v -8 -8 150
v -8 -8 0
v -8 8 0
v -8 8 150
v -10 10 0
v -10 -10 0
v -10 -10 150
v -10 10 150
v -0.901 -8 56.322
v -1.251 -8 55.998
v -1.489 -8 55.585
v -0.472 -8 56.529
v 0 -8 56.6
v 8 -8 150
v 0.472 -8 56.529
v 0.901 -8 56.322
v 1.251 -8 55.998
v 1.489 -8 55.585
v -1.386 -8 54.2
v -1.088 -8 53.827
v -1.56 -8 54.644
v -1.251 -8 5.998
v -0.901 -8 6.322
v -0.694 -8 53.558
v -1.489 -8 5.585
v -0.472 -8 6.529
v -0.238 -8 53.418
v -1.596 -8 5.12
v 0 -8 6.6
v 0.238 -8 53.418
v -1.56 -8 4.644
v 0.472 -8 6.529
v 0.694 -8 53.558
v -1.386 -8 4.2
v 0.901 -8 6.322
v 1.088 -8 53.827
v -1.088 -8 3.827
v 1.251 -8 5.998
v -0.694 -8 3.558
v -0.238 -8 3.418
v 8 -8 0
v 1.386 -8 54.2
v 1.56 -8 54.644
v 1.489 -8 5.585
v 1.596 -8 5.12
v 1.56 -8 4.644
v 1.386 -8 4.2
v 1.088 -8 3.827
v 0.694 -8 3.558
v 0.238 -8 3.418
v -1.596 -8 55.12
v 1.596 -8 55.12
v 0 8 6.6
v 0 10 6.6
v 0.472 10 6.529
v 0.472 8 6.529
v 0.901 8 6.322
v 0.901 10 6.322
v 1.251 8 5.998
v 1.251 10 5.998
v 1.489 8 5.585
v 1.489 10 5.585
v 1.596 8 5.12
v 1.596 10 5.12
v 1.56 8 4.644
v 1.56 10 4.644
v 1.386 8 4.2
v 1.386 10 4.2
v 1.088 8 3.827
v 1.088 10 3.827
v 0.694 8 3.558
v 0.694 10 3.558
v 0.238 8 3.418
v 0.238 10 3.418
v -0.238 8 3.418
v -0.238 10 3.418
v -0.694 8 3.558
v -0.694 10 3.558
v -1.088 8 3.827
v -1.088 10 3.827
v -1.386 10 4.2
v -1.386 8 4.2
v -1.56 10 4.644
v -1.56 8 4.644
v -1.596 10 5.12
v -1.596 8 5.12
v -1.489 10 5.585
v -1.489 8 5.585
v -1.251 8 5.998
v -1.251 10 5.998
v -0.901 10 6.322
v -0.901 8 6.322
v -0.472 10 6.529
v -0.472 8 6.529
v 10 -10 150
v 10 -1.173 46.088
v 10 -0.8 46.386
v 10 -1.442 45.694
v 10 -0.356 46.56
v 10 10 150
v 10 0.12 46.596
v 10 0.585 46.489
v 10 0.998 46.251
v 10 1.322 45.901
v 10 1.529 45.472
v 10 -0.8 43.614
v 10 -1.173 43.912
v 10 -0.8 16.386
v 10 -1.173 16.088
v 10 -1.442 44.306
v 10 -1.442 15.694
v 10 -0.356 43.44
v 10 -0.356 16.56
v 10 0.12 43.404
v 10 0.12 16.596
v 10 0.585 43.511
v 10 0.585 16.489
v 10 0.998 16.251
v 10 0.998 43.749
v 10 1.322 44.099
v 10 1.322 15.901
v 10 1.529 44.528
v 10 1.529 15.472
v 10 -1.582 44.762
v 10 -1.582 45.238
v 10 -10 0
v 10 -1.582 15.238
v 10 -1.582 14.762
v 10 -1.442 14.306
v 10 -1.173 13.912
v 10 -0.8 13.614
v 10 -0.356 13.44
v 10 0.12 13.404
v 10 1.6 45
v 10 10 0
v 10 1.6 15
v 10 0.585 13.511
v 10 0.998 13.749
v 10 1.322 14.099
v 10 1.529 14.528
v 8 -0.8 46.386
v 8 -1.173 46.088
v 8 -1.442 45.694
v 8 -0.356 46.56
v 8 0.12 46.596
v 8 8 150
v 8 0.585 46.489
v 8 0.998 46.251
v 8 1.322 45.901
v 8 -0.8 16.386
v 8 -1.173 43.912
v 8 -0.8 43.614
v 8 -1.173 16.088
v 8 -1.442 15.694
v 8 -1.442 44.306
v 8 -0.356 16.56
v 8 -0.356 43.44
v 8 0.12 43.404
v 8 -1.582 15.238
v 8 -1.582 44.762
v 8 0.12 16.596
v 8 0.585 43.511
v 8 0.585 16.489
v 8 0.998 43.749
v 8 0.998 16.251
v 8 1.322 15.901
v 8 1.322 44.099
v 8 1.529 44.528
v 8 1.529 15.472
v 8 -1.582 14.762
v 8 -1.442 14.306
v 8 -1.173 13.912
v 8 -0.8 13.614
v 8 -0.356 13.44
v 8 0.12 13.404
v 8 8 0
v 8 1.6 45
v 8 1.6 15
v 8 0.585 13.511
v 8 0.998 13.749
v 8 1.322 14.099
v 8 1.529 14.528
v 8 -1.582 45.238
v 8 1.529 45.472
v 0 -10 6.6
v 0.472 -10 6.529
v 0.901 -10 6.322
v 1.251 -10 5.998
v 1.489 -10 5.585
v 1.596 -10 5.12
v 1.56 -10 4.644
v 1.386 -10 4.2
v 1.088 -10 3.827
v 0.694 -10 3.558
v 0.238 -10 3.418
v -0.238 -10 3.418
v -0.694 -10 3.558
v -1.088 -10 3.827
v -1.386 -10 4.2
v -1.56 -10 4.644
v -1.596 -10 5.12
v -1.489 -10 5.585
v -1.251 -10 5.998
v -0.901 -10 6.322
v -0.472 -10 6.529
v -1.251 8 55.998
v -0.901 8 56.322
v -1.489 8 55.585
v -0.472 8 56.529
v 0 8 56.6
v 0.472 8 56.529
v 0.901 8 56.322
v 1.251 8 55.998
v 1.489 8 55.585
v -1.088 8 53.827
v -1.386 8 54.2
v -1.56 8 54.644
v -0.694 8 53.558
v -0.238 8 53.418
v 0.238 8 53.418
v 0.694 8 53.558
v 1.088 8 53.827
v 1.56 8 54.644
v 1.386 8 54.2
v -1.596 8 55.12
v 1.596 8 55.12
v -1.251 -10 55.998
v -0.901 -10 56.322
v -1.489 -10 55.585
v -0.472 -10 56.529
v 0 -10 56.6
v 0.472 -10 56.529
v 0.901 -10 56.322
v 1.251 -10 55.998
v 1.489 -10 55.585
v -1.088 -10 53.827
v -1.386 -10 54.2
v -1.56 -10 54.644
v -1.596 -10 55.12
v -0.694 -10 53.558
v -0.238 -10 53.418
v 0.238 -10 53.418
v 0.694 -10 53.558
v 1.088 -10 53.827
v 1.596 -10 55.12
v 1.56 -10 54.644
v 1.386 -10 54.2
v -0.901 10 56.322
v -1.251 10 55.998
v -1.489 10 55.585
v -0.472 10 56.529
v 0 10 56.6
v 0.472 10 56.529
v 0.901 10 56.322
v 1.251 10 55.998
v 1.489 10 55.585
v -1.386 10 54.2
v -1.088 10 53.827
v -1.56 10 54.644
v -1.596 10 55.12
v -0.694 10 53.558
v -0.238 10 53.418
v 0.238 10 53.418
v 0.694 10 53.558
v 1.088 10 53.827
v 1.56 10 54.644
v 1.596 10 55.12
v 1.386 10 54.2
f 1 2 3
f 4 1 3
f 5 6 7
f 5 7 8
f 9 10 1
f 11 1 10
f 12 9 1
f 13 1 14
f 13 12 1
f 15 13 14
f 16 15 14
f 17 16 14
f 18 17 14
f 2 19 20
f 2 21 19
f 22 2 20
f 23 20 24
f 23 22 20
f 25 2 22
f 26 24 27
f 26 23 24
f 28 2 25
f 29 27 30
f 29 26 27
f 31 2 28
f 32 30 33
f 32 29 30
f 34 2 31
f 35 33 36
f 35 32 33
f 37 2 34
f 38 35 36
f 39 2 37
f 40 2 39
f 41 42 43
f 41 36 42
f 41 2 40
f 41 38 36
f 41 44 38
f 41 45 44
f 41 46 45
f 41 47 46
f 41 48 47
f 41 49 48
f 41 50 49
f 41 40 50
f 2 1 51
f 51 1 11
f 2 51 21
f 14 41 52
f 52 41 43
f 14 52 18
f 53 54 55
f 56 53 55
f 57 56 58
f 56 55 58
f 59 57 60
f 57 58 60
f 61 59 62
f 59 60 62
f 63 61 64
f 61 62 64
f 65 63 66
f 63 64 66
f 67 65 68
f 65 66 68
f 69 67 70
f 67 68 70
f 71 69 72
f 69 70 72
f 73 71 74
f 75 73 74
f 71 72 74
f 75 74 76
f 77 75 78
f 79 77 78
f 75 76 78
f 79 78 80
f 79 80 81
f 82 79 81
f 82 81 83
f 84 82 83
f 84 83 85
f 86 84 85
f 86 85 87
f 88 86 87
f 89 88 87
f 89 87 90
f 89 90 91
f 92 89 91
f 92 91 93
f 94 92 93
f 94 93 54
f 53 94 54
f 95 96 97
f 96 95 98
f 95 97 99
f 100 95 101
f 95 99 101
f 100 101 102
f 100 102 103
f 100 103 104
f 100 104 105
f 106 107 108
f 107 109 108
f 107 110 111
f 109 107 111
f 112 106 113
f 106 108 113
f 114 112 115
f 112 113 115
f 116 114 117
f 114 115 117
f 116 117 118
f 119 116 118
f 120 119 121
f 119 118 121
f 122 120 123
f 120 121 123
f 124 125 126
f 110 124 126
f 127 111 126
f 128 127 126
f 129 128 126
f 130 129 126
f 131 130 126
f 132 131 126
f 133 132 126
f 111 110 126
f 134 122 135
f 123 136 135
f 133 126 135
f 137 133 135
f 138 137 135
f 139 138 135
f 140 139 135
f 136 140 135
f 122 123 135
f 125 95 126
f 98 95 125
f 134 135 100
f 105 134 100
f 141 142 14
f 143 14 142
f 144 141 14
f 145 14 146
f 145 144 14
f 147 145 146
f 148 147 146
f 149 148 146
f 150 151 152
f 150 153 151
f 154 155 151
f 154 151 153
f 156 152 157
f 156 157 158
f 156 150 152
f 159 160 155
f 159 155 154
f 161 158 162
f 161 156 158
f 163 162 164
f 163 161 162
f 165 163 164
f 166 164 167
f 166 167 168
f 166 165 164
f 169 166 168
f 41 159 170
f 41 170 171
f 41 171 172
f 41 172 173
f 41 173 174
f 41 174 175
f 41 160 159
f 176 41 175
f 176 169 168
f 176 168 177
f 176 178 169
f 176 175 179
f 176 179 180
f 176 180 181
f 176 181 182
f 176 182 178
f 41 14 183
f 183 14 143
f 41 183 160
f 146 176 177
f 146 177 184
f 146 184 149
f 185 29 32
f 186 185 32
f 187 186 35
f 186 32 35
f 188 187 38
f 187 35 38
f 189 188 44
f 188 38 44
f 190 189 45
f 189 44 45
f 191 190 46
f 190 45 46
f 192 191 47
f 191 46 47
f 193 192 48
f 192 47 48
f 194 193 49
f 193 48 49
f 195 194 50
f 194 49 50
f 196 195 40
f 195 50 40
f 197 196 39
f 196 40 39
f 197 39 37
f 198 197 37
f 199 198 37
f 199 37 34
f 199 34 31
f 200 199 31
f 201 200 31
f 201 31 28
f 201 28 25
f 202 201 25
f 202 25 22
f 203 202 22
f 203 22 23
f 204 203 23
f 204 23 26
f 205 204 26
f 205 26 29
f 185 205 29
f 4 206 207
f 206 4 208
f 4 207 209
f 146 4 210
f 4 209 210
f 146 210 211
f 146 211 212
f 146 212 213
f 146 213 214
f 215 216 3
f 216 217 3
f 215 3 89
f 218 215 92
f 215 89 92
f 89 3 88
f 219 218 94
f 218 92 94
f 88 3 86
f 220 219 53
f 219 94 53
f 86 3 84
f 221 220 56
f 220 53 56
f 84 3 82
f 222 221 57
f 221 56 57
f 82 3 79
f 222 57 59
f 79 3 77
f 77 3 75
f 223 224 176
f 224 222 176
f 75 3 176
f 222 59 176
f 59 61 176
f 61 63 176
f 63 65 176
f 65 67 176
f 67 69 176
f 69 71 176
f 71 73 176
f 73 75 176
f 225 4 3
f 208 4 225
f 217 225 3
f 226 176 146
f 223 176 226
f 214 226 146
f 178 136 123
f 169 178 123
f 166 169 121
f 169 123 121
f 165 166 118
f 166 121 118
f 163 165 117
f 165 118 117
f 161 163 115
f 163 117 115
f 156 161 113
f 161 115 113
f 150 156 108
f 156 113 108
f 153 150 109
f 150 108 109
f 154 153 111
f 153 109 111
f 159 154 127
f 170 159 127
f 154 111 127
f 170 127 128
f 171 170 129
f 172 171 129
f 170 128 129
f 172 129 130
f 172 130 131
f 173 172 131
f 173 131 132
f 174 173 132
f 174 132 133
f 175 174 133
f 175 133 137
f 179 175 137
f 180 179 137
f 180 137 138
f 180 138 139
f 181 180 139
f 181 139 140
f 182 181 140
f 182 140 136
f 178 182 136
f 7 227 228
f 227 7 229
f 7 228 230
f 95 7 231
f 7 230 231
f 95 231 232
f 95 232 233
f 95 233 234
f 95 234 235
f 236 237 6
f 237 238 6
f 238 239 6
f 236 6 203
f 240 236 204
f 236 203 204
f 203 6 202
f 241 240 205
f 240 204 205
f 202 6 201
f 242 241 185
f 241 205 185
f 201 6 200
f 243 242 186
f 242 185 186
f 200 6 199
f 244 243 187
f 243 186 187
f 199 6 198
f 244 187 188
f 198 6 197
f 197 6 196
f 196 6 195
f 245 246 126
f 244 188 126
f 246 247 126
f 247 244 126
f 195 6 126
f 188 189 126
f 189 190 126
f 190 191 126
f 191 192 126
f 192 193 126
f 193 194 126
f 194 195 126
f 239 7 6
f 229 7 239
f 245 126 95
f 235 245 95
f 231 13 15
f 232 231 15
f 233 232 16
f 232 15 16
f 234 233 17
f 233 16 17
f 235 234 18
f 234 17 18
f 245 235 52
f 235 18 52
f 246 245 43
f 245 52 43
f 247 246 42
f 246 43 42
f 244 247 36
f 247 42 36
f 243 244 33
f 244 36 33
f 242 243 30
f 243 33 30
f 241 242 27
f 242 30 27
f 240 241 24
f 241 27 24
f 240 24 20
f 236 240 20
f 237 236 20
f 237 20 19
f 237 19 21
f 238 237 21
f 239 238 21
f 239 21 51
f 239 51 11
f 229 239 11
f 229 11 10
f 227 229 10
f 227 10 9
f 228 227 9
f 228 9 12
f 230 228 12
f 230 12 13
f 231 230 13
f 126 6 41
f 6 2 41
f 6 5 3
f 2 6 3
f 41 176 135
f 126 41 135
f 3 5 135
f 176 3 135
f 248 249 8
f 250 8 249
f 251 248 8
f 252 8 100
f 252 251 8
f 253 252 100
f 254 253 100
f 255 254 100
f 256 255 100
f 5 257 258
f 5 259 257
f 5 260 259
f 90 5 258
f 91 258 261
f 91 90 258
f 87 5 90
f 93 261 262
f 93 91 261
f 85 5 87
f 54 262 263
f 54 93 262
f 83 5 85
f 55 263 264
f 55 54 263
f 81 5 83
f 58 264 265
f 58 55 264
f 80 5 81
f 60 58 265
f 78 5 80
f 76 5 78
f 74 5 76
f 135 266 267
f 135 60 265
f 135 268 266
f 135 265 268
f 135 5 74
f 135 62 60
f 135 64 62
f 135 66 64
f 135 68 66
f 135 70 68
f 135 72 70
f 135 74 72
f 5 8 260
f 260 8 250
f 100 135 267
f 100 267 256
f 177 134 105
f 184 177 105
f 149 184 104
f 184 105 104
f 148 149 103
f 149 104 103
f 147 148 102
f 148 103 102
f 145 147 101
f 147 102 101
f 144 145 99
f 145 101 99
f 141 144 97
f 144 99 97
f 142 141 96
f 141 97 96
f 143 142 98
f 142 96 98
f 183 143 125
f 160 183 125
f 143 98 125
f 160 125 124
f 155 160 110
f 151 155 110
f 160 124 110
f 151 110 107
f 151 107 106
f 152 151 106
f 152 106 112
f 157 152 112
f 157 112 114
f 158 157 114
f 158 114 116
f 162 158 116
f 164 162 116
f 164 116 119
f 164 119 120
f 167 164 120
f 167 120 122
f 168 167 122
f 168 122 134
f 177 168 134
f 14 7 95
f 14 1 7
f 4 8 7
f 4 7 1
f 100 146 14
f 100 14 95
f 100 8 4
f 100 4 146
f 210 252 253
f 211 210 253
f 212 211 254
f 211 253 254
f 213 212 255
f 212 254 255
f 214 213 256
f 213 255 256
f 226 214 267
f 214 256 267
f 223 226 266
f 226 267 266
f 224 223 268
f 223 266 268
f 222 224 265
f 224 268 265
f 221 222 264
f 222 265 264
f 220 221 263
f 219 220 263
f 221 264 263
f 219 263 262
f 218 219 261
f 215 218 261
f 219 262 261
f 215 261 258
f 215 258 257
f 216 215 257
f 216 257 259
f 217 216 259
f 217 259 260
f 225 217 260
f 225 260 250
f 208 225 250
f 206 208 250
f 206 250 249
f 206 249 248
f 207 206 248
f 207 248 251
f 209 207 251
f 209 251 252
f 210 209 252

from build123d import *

# Parameters (mm, degrees)
SKETCH_1_W          = 20
SKETCH_1_H          = 20
SKETCH_1_W_2        = 16
SKETCH_1_H_2        = 16
EXTRUDE_1_DEPTH     = 150
SKETCH_2_R          = 1.6
CUT_EXTRUDE_1_DEPTH = 408.37168574
SKETCH_3_R          = 1.6
CUT_EXTRUDE_2_DEPTH = 10


with BuildPart() as part:
    # ｽｹｯﾁ1 → ﾎﾞｽ - 押し出し1 (new body)
    with BuildSketch(Plane.XY):
        Rectangle(SKETCH_1_W, SKETCH_1_H)
        Rectangle(SKETCH_1_W_2, SKETCH_1_H_2, mode=Mode.SUBTRACT)
    extrude(amount=EXTRUDE_1_DEPTH)

    # ｽｹｯﾁ2 → ｶｯﾄ - 押し出し1 (cut)
    with BuildSketch(Plane(origin=(0, 10, 0), x_dir=(1, 0, 0), z_dir=(0, 1, 0))):
        with Locations(Location((0, -5, 0), (0, 0, 270))):
            Circle(SKETCH_2_R)
        with Locations(Location((0, -55, 0), (0, 0, 270))):
            Circle(SKETCH_2_R)
    extrude(amount=-CUT_EXTRUDE_1_DEPTH, mode=Mode.SUBTRACT)

    # ｽｹｯﾁ3 → ｶｯﾄ - 押し出し2 (cut)
    with BuildSketch(Plane(origin=(10, 0, 0), x_dir=(0, 0, -1), z_dir=(1, 0, 0))):
        with Locations(Location((-15, 0, 0), (0, 0, 90))):
            Circle(SKETCH_3_R)
        with Locations(Location((-45, 0, 0), (0, 0, 90))):
            Circle(SKETCH_3_R)
    extrude(amount=-CUT_EXTRUDE_2_DEPTH, mode=Mode.SUBTRACT)


solid = part.part
